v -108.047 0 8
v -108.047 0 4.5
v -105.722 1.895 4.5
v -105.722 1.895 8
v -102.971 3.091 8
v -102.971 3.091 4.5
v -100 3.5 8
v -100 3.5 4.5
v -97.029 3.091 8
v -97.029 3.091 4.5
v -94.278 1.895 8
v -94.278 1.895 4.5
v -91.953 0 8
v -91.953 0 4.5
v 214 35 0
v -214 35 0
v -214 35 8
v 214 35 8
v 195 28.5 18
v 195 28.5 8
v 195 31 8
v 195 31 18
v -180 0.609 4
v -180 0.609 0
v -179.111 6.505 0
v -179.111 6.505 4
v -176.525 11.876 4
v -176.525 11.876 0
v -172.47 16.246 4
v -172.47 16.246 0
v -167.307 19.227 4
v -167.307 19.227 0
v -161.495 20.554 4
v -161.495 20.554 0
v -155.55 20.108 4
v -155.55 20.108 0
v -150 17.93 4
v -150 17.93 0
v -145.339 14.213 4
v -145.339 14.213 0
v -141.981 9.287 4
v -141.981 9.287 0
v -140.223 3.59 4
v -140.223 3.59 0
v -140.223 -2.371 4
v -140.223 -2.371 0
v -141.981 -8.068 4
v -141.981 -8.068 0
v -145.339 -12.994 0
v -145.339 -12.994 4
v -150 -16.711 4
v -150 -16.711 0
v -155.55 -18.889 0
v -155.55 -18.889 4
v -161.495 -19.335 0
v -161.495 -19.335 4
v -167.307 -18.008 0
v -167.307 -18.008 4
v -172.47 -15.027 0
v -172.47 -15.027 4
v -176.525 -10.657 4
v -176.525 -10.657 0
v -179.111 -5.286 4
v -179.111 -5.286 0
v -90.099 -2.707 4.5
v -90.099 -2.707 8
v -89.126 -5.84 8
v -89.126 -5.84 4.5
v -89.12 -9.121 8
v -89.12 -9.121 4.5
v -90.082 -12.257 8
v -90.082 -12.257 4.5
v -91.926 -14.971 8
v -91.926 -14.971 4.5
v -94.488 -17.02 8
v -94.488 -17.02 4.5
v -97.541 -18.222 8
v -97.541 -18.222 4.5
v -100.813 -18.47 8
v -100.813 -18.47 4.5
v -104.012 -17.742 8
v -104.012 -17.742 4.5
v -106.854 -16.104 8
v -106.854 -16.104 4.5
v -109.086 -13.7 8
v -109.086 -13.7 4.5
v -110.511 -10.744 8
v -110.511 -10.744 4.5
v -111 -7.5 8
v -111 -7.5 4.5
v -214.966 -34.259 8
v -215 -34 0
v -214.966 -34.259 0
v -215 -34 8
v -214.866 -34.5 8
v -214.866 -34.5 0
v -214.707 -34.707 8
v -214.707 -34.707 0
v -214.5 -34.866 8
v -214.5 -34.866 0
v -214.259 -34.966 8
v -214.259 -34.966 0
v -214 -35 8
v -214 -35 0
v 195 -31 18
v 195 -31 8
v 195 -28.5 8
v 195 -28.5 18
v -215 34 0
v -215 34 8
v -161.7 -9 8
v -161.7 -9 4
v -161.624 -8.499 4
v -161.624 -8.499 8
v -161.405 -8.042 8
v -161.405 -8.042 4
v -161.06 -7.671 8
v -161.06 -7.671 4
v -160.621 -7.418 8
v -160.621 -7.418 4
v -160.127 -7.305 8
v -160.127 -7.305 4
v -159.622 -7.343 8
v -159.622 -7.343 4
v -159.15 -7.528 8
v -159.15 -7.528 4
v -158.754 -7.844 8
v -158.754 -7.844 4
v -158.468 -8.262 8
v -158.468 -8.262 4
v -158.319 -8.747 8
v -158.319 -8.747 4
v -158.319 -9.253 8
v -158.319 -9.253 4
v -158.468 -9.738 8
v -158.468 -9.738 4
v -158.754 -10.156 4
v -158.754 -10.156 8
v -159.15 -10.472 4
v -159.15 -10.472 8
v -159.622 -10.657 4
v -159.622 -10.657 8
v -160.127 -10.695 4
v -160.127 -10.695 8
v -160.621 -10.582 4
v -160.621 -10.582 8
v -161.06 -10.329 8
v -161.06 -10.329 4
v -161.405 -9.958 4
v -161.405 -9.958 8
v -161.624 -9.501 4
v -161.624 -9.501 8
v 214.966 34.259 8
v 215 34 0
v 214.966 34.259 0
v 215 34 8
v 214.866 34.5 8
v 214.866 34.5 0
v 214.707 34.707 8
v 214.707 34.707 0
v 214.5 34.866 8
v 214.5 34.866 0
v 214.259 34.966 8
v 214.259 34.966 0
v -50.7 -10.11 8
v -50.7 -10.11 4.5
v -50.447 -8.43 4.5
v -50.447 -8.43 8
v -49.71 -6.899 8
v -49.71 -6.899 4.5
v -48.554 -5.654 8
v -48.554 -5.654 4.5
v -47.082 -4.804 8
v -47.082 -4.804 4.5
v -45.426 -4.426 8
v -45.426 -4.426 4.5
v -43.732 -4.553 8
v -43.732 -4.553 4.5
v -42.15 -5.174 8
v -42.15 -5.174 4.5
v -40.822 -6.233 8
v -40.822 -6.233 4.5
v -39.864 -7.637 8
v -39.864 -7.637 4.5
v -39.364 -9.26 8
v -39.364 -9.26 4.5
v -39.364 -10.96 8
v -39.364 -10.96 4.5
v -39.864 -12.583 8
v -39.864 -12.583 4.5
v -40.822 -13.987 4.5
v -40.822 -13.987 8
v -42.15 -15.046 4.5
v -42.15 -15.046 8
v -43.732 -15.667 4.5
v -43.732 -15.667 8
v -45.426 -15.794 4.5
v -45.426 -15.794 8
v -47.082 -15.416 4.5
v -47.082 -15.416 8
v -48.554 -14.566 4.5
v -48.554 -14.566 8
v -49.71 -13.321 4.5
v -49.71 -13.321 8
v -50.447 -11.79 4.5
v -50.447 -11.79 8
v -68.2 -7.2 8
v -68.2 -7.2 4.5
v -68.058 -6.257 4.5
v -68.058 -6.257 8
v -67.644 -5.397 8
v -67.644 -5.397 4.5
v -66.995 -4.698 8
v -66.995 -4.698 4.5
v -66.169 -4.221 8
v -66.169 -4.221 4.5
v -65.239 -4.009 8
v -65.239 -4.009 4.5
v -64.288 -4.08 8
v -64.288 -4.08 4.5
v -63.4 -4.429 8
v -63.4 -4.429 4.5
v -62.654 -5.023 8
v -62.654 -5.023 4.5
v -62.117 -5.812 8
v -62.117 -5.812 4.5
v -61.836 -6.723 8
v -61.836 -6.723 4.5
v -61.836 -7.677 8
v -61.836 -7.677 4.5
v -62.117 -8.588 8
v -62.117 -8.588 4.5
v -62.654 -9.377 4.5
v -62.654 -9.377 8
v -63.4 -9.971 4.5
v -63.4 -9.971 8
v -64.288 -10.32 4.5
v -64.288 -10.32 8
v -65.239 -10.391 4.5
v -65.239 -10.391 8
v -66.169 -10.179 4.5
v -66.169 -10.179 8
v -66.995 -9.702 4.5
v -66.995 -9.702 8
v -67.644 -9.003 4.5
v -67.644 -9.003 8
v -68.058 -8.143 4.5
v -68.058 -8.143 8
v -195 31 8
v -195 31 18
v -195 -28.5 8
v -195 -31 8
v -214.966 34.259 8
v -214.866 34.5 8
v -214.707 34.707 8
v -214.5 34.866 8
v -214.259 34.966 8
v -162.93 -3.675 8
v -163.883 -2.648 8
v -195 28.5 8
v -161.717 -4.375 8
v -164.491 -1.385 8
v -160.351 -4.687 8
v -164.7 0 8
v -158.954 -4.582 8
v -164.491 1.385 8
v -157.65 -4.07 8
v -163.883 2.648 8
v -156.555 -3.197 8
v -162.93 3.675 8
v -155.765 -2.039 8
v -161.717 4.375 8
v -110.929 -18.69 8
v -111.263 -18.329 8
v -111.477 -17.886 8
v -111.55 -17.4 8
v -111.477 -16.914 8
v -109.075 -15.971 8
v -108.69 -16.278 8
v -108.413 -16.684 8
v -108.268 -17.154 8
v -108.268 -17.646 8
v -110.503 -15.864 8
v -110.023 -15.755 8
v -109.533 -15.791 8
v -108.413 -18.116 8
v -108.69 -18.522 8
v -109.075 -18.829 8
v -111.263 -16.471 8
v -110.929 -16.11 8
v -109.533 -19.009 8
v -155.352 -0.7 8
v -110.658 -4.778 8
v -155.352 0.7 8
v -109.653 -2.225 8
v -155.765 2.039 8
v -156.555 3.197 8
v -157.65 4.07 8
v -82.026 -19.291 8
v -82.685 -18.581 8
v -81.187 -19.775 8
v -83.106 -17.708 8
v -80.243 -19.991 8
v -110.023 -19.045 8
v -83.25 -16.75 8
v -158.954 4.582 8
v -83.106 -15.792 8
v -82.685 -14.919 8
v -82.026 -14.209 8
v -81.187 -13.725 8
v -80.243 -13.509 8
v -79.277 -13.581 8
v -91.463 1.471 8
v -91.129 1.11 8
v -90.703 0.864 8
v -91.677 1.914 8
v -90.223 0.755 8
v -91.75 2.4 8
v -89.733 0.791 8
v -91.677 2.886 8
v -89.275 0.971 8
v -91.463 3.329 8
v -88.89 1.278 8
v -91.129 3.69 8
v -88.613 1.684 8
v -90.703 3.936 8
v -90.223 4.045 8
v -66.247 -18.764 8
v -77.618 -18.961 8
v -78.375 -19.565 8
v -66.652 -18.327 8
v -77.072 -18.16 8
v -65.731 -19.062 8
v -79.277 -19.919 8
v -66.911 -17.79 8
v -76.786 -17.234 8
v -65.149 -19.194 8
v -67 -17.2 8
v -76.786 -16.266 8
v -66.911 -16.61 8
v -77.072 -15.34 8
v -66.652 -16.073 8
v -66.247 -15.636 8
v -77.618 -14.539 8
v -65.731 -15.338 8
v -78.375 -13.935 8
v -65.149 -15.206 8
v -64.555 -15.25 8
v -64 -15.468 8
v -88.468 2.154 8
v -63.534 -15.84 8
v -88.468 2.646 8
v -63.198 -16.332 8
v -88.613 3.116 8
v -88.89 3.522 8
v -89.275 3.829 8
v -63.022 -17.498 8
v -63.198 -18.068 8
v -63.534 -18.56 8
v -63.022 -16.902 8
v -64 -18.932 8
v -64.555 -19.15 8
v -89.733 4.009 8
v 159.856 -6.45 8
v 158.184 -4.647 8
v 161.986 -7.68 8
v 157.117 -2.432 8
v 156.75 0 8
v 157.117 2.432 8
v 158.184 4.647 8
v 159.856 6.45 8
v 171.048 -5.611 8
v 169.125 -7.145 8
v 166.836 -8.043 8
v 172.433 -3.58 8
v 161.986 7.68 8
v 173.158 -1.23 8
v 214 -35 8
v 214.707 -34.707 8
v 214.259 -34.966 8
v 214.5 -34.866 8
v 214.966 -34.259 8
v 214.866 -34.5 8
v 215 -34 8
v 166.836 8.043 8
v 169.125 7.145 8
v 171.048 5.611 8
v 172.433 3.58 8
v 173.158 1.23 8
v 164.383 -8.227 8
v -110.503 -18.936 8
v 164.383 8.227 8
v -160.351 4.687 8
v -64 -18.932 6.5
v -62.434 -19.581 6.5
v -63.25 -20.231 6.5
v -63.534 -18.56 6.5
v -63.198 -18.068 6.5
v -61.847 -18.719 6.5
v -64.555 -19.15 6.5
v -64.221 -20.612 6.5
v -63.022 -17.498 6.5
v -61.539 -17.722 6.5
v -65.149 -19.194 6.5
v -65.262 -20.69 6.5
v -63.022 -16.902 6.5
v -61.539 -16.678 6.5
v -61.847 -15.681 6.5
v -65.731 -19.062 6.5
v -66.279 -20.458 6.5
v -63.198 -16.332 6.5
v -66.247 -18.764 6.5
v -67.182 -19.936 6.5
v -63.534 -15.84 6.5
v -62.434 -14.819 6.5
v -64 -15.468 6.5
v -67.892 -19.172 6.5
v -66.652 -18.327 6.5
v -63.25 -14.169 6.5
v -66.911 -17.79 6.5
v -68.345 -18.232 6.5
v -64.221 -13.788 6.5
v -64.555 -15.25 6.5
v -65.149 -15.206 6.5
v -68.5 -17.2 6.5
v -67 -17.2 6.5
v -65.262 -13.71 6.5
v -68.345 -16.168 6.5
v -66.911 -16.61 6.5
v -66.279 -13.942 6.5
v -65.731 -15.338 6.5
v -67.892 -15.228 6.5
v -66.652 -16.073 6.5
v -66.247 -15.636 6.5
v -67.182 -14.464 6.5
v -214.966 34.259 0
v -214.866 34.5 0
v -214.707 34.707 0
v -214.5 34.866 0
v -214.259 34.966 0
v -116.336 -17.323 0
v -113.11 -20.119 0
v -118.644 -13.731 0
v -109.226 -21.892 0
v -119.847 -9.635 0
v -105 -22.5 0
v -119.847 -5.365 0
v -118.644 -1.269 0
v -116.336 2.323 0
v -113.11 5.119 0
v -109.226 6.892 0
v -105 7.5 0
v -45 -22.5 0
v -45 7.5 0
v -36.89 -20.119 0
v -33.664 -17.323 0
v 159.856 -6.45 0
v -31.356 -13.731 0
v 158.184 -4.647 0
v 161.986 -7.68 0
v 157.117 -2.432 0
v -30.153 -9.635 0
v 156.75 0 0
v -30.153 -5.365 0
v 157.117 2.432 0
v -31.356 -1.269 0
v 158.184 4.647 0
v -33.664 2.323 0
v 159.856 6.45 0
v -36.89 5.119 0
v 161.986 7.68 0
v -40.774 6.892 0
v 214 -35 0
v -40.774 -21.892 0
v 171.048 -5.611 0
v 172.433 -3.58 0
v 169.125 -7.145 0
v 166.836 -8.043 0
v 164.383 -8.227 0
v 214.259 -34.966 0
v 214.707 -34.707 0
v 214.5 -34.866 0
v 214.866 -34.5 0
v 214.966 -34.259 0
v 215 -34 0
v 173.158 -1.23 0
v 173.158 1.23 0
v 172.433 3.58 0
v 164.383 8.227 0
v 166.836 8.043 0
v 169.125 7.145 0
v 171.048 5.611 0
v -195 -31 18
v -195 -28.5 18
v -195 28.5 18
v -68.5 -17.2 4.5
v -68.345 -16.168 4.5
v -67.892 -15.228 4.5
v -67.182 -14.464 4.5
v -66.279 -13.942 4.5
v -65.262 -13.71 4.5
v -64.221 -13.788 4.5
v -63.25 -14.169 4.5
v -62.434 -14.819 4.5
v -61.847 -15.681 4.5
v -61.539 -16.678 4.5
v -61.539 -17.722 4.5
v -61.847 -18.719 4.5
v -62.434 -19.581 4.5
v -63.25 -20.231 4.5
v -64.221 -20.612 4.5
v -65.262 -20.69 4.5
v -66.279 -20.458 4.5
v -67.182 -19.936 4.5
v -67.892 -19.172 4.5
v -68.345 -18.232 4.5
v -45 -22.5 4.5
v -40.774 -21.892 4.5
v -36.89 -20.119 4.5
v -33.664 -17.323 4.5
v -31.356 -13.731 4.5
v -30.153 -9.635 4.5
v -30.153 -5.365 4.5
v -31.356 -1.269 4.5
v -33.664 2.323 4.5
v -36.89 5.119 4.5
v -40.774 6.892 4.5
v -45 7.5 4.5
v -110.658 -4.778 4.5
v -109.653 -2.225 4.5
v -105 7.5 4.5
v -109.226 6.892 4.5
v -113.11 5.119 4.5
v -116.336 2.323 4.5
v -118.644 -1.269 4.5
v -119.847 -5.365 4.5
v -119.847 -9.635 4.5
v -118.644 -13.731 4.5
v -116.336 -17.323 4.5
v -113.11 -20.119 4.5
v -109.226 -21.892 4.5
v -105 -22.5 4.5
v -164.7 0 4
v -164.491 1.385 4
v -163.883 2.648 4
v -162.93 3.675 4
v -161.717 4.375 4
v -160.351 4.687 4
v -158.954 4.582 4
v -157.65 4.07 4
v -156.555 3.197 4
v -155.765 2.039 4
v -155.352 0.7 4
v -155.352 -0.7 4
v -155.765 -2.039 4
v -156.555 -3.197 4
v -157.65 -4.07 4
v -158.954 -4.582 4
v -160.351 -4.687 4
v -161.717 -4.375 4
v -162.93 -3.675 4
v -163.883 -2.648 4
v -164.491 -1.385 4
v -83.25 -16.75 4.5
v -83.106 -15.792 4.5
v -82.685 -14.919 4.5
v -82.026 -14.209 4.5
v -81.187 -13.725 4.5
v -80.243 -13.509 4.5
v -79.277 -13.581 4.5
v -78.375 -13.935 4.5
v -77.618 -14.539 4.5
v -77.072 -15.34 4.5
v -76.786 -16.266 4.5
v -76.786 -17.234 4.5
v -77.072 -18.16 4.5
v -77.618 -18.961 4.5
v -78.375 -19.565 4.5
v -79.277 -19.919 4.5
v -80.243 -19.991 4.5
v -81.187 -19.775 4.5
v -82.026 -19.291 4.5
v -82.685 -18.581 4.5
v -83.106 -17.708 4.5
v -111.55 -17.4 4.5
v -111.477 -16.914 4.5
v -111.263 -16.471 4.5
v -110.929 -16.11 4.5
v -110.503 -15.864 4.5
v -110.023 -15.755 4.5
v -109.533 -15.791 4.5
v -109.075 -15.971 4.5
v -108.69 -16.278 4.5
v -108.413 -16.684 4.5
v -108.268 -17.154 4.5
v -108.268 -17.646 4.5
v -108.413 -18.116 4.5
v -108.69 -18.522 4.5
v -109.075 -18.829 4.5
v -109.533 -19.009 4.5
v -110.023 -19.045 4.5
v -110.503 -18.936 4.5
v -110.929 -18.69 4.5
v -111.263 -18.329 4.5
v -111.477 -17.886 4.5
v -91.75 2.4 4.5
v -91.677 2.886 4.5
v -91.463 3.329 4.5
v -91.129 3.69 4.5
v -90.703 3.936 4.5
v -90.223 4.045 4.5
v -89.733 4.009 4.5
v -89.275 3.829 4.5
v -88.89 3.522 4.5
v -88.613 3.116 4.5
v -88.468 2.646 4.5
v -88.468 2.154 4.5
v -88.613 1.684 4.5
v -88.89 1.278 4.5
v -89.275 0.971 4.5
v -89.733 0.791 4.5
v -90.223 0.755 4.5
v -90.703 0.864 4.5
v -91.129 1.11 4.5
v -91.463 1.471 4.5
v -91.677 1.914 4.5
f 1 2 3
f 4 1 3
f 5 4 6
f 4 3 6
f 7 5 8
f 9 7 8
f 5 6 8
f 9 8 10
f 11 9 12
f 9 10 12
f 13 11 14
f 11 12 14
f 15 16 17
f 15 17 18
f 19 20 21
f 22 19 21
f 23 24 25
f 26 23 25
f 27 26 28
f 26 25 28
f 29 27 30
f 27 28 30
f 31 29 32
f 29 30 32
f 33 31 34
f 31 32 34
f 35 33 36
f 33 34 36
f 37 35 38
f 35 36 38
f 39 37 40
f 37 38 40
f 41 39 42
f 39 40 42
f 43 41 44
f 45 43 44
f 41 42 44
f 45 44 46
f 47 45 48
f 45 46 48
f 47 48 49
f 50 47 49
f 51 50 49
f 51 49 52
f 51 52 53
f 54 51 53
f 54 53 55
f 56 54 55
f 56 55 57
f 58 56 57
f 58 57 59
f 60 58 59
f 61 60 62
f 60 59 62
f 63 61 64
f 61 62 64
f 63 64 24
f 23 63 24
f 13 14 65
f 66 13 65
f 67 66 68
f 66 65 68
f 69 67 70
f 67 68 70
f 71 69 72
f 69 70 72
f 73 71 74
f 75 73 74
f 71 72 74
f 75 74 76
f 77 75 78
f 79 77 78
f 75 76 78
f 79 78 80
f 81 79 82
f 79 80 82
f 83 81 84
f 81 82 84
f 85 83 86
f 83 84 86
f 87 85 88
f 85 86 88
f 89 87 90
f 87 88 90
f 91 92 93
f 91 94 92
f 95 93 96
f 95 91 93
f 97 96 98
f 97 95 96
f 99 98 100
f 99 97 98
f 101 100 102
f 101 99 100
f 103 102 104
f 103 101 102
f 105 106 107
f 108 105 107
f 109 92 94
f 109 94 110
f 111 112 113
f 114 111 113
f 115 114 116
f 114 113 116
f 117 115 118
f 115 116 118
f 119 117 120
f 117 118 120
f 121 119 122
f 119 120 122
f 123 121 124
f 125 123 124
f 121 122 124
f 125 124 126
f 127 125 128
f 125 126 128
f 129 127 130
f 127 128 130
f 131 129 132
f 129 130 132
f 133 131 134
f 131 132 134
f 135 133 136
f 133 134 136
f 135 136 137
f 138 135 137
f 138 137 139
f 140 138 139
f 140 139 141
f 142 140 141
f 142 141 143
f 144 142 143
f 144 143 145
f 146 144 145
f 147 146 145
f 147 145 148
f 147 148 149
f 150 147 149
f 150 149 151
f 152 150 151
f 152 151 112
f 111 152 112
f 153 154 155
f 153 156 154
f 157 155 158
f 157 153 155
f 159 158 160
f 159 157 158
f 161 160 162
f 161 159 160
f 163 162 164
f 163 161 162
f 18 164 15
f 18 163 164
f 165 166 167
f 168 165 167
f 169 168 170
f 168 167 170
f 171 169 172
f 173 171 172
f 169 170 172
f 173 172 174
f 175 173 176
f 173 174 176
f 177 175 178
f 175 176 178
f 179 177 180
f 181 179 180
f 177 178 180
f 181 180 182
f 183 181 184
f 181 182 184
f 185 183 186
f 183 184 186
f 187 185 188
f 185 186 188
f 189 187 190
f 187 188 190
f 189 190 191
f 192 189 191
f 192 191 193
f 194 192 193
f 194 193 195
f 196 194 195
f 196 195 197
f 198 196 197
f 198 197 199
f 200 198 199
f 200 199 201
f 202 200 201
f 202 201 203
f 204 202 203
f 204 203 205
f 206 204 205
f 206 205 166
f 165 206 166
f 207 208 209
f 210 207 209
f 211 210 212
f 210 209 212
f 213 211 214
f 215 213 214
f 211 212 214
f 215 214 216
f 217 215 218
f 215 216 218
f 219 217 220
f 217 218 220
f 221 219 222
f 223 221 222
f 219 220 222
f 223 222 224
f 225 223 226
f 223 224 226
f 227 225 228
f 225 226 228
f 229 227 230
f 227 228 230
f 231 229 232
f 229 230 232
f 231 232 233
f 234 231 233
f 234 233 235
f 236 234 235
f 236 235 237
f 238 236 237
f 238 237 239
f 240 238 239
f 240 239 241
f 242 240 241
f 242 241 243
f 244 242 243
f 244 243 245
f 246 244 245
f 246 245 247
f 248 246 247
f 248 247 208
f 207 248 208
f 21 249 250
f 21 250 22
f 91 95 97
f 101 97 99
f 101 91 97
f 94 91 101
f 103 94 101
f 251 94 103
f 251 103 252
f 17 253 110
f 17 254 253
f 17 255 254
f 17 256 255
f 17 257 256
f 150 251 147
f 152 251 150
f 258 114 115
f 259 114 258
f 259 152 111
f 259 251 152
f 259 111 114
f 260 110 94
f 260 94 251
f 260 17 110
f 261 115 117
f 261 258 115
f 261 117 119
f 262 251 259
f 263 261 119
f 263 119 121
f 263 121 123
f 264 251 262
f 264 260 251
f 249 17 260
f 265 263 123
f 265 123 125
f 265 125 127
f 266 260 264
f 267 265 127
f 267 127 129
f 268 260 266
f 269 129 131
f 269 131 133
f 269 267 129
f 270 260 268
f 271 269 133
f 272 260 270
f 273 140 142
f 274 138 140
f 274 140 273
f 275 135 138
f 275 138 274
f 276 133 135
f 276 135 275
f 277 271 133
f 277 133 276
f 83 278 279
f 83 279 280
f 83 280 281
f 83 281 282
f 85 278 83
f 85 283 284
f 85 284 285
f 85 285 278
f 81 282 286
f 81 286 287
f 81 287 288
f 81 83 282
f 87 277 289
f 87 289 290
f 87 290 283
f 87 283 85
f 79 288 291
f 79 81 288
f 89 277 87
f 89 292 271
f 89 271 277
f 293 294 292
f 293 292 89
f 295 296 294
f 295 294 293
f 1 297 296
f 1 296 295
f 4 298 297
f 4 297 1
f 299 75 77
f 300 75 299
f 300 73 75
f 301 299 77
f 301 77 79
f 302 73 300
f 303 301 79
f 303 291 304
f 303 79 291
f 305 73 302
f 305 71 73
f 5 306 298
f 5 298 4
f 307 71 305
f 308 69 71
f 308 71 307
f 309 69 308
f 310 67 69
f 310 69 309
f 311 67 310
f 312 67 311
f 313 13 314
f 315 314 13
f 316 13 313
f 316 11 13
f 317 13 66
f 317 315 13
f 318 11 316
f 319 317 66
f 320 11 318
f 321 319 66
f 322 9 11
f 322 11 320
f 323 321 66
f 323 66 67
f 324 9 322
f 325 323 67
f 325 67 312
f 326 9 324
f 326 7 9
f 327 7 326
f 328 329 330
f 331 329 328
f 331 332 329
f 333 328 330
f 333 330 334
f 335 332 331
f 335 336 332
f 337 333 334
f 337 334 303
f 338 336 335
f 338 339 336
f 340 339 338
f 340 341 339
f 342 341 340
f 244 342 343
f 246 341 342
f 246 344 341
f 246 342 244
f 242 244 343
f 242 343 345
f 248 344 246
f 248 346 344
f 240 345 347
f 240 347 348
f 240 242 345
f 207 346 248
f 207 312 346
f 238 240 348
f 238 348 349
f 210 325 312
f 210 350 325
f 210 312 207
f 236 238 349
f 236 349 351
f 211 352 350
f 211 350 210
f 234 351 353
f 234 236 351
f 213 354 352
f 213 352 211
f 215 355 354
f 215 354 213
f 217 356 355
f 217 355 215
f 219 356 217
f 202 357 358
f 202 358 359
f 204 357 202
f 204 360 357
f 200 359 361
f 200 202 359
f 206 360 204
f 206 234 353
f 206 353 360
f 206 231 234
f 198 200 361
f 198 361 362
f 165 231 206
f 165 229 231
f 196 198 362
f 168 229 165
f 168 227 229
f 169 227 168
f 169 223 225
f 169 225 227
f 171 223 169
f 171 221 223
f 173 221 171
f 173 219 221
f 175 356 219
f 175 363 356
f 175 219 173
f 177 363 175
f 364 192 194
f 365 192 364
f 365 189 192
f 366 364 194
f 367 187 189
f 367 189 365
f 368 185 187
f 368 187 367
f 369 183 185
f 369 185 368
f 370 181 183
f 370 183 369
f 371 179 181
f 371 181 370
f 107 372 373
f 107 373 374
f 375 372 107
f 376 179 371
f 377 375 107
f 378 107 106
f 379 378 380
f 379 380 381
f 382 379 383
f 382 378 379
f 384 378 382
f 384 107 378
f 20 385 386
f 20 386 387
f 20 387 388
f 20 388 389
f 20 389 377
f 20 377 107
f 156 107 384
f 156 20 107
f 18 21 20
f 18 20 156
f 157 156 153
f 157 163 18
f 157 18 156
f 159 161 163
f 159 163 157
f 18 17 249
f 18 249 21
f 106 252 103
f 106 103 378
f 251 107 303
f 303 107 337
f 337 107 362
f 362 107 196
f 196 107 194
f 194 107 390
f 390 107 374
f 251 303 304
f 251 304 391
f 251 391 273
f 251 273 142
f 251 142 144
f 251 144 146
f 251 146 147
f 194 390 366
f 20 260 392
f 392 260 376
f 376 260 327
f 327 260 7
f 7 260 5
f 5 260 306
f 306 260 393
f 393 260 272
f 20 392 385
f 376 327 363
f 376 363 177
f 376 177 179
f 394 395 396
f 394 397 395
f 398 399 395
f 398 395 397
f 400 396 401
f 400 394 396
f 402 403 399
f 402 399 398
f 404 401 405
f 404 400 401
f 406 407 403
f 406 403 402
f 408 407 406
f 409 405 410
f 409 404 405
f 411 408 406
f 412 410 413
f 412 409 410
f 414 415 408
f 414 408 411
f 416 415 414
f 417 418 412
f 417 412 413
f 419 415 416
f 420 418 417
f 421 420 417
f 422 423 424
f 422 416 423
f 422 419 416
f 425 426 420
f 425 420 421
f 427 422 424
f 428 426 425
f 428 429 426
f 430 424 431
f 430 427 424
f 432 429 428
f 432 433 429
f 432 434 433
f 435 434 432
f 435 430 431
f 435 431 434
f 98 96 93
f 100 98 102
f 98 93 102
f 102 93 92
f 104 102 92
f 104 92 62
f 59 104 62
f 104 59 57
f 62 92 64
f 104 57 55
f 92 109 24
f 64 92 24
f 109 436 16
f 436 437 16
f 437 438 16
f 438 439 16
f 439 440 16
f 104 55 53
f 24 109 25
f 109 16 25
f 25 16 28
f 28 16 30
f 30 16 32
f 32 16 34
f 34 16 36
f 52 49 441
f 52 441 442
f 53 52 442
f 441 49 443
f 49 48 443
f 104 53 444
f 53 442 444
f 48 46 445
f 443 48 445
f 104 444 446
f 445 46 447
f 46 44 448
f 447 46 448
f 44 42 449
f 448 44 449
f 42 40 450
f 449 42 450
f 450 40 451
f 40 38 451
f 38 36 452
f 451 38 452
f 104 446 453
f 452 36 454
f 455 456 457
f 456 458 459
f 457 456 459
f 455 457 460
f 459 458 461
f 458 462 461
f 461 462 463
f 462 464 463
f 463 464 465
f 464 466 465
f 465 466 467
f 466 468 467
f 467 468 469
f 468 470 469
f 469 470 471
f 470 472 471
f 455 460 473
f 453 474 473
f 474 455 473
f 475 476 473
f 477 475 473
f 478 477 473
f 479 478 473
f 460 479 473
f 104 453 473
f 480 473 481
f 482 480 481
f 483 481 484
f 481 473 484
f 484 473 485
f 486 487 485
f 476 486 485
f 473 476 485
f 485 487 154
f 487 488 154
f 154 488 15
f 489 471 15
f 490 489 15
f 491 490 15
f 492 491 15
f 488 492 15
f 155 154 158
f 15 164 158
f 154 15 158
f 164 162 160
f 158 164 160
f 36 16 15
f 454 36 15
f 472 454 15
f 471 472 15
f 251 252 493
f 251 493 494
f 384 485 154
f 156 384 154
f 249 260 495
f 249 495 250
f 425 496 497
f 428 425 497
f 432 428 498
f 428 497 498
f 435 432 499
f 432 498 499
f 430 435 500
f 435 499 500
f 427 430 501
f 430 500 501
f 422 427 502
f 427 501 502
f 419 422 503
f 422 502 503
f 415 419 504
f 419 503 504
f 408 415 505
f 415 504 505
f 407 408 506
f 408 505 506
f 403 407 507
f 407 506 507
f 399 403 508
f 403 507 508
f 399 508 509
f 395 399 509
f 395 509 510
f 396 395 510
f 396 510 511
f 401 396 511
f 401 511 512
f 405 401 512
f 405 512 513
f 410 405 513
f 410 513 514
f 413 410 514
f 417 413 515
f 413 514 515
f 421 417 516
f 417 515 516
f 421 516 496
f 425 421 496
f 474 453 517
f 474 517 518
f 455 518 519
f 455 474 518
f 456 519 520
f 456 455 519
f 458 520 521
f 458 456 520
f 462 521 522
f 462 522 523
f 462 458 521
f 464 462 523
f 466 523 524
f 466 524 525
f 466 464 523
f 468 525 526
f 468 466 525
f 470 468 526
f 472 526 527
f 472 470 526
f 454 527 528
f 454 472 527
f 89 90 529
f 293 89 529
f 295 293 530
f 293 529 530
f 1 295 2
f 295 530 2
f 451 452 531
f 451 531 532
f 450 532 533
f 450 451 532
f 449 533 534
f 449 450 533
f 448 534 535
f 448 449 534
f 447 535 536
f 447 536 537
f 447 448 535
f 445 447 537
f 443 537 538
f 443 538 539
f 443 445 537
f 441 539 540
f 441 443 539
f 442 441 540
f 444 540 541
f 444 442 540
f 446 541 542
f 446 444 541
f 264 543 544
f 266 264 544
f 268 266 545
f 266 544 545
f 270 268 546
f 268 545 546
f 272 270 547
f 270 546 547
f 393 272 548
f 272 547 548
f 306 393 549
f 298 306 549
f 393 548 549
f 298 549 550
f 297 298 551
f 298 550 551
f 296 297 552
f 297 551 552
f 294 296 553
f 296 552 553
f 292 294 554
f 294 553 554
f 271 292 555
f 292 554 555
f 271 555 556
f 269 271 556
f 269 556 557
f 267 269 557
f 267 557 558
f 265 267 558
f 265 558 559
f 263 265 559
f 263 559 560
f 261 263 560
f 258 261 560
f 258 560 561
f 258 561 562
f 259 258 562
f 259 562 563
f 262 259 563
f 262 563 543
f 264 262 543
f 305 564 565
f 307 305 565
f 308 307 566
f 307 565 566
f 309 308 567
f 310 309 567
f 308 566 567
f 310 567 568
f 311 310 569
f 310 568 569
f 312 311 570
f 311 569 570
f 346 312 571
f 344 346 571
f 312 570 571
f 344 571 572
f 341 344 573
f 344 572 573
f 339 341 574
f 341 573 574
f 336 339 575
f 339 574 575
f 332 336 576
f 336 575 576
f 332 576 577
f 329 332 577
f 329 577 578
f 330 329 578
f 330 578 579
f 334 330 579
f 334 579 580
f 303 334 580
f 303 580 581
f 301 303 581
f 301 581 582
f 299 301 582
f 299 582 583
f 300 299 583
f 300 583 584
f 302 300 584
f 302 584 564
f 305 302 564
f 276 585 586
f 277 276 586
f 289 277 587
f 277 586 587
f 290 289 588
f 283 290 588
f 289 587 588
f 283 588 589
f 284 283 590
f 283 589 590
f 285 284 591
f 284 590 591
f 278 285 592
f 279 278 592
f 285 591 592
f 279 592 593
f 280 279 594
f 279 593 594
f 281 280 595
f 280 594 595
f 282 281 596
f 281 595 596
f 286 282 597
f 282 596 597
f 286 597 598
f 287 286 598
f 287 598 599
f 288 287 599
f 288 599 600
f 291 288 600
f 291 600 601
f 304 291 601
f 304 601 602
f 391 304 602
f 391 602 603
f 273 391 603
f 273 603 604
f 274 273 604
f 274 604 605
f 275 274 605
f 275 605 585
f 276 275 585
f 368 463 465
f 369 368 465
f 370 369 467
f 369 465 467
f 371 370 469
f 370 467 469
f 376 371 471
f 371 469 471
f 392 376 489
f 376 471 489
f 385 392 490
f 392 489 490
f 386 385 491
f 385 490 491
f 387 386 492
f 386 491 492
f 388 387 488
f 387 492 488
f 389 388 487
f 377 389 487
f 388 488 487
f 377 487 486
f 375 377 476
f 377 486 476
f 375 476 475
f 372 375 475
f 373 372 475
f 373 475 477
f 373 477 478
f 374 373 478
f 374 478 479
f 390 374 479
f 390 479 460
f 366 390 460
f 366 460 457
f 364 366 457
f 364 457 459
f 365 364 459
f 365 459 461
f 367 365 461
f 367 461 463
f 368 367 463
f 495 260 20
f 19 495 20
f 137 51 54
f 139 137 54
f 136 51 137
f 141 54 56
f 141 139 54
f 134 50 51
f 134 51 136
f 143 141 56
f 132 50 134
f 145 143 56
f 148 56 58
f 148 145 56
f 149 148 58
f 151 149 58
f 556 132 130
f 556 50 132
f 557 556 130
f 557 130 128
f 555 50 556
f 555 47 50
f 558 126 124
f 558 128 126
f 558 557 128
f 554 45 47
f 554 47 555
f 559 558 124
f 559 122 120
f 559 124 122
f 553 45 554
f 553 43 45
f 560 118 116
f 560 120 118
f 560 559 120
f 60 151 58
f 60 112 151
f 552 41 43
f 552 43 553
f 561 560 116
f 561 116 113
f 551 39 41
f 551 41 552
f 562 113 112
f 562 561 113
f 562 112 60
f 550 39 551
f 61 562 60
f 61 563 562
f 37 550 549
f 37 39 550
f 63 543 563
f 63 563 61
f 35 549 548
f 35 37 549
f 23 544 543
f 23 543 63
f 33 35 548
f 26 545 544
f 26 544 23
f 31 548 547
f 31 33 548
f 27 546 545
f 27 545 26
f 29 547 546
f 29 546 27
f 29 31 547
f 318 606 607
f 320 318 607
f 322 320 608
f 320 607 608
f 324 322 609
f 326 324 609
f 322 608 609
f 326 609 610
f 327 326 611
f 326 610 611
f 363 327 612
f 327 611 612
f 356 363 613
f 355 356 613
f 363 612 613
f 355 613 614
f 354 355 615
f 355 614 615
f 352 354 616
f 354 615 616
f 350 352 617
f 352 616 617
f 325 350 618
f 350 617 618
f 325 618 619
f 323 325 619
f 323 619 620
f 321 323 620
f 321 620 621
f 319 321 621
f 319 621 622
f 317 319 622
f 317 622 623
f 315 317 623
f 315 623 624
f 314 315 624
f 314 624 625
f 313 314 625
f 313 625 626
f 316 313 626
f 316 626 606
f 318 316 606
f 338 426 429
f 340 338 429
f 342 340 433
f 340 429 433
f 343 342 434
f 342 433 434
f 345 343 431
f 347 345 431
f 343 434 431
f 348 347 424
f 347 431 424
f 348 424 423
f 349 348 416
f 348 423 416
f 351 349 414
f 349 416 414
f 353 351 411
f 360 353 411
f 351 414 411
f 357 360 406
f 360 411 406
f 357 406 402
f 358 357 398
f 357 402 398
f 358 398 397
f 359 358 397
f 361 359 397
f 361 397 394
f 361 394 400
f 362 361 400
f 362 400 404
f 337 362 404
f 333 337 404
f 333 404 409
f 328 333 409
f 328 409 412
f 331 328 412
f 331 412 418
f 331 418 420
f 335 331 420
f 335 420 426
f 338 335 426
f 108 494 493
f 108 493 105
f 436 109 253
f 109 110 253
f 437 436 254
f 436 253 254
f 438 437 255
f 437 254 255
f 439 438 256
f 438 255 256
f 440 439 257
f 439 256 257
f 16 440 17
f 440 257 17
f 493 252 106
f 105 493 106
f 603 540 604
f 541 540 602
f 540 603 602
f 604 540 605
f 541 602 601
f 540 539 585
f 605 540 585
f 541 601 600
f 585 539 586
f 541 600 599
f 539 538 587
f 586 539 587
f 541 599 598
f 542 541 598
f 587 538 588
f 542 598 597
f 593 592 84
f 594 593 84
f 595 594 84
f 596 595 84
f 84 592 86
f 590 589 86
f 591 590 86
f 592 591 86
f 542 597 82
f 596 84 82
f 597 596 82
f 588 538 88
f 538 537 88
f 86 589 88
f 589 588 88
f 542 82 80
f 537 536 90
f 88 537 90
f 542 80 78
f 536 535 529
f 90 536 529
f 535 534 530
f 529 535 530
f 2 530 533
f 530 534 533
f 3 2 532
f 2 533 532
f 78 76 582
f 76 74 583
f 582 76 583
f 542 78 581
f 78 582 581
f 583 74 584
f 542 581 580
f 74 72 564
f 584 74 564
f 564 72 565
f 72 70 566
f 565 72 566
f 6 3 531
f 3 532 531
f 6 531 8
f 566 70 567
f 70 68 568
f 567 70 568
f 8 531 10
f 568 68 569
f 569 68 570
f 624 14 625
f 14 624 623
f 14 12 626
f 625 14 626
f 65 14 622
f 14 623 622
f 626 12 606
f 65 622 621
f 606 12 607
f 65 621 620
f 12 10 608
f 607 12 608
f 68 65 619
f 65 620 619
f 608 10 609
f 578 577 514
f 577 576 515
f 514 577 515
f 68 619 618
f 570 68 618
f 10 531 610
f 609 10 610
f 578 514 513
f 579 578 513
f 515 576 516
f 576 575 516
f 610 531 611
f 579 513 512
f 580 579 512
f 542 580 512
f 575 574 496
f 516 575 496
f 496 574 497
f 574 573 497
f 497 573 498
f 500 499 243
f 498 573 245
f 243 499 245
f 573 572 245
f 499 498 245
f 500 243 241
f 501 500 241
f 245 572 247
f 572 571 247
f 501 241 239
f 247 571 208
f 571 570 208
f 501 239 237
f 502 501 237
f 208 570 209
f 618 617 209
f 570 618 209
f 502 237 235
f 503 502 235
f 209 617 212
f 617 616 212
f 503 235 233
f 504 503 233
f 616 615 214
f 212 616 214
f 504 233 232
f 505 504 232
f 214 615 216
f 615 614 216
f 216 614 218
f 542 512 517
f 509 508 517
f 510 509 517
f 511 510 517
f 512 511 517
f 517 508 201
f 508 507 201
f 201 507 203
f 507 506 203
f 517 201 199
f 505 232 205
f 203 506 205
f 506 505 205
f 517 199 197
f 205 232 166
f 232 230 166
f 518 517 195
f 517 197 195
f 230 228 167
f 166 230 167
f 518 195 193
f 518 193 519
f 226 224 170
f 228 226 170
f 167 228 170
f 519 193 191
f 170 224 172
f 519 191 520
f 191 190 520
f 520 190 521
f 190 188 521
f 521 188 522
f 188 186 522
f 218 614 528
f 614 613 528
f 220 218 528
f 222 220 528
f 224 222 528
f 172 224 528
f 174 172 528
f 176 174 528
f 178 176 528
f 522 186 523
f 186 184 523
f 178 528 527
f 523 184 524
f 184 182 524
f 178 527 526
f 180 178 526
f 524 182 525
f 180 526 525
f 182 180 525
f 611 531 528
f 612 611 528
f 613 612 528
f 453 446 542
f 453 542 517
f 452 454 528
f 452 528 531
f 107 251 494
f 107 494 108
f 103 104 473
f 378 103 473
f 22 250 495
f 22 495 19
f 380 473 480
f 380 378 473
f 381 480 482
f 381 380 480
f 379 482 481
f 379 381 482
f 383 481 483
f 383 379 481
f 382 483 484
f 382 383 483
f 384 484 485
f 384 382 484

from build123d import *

# Parameters (mm, degrees)
SKETCH_1_W          = 430
SKETCH_1_H          = 70
EXTRUDE_1_DEPTH     = 8
FILLET_1_R          = 1
SKETCH_2_W          = 390
SKETCH_2_H          = 2.5
EXTRUDE_2_DEPTH     = 10
SKETCH_3_R          = 1.65
SKETCH_3_R_2        = 3.25
SKETCH_3_R_3        = 5.7
SKETCH_3_R_4        = 4.7
SKETCH_3_R_5        = 1.7
SKETCH_3_R_6        = 2
SKETCH_3_R_7        = 3.2
CUT_EXTRUDE_1_DEPTH = 19
CUT_EXTRUDE_2_DEPTH = 4.5
SKETCH_5_R          = 3.5
CUT_EXTRUDE_3_DEPTH = 2
SKETCH_6_R          = 8.25
CUT_EXTRUDE_4_DEPTH = 19
SKETCH_7_R          = 20
CUT_EXTRUDE_5_DEPTH = 4


with BuildPart() as part:
    # 草圖1 → 填料-伸長1 (new body)
    with BuildSketch(Plane.XY):
        Rectangle(SKETCH_1_W, SKETCH_1_H)
    extrude(amount=EXTRUDE_1_DEPTH)

    # 圓角1
    fillet_1_edges = [part.edges().sort_by_distance(p)[0] for p in [
        (215, -35, 4),
        (-215, -35, 4),
        (-215, 35, 4),
        (215, 35, 4),
    ]]
    fillet(fillet_1_edges, radius=FILLET_1_R)

    # 草圖2 → 填料-伸長2 (add)
    with BuildSketch(Plane.XY.offset(8)):
        with Locations((0, 29.75)):
            Rectangle(SKETCH_2_W, SKETCH_2_H)
        with Locations((0, -29.75)):
            Rectangle(SKETCH_2_W, SKETCH_2_H)
    extrude(amount=EXTRUDE_2_DEPTH)

    # 草圖3 → 除料-伸長1 (cut, through all)
    with BuildSketch(Plane(origin=(0, 0, 0), x_dir=(-1, 0, 0), z_dir=(0, 0, -1))):
        with Locations((90.1, 2.4)):
            Circle(SKETCH_3_R)
        with BuildLine():
            ThreePointArc((111, -7.5), (110.23508972, -3.469747103), (108.04673847, 0))
            Line((108.04673847, 0), (91.95326153, 0))
            ThreePointArc((91.95326153, 0), (95.969747103, -17.73508972), (111, -7.5))
        make_face()
        with BuildLine():
            Line((91.95326153, 0), (108.04673847, 0))
            ThreePointArc((108.04673847, 0), (100, 3.5), (91.95326153, 0))
        make_face()
        with Locations((109.9, -17.4)):
            Circle(SKETCH_3_R)
        with Locations((80, -16.75)):
            Circle(SKETCH_3_R_2)
        with Locations((45, -10.11)):
            Circle(SKETCH_3_R_3)
        with Locations((160, 0)):
            Circle(SKETCH_3_R_4)
        with Locations((160, -9)):
            Circle(SKETCH_3_R_5)
        with BuildLine():
            ThreePointArc((155.3, 0), (160, -4.7), (164.7, 0))
            Line((164.7, 0), (155.3, 0))
        make_face()
        with BuildLine():
            Line((155.3, 0), (164.7, 0))
            ThreePointArc((164.7, 0), (160, 4.7), (155.3, 0))
        make_face()
        with Locations((65, -17.2)):
            Circle(SKETCH_3_R_6)
        with Locations((65, -7.2)):
            Circle(SKETCH_3_R_7)
    extrude(amount=-CUT_EXTRUDE_1_DEPTH, mode=Mode.SUBTRACT)

    # 草圖4 → 除料-伸長2 (cut)
    with BuildSketch(Plane(origin=(0, 0, 0), x_dir=(-1, 0, 0), z_dir=(0, 0, -1))):
        with BuildLine():
            Line((45, 7.5), (105, 7.5))
            ThreePointArc((105, 7.5), (120, -7.5), (105, -22.5))
            Line((105, -22.5), (45, -22.5))
            ThreePointArc((45, -22.5), (30, -7.5), (45, 7.5))
        make_face()
    extrude(amount=-CUT_EXTRUDE_2_DEPTH, mode=Mode.SUBTRACT)

    # 草圖5 → 除料-伸長3 (cut)
    with BuildSketch(Plane(origin=(0, 0, 4.5), x_dir=(-1, 0, 0), z_dir=(0, 0, -1))):
        with Locations((65, -17.2)):
            Circle(SKETCH_5_R)
    extrude(amount=-CUT_EXTRUDE_3_DEPTH, mode=Mode.SUBTRACT)

    # 草圖6 → 除料-伸長4 (cut, through all)
    with BuildSketch(Plane(origin=(0, 0, 0), x_dir=(-1, 0, 0), z_dir=(0, 0, -1))):
        with Locations((-165, 0)):
            Circle(SKETCH_6_R)
    extrude(amount=-CUT_EXTRUDE_4_DEPTH, mode=Mode.SUBTRACT)

    # 草圖7 → 除料-伸長5 (cut)
    with BuildSketch(Plane(origin=(0, 0, 0), x_dir=(-1, 0, 0), z_dir=(0, 0, -1))):
        with Locations((160, 0.609446204)):
            Circle(SKETCH_7_R)
    extrude(amount=-CUT_EXTRUDE_5_DEPTH, mode=Mode.SUBTRACT)


solid = part.part
